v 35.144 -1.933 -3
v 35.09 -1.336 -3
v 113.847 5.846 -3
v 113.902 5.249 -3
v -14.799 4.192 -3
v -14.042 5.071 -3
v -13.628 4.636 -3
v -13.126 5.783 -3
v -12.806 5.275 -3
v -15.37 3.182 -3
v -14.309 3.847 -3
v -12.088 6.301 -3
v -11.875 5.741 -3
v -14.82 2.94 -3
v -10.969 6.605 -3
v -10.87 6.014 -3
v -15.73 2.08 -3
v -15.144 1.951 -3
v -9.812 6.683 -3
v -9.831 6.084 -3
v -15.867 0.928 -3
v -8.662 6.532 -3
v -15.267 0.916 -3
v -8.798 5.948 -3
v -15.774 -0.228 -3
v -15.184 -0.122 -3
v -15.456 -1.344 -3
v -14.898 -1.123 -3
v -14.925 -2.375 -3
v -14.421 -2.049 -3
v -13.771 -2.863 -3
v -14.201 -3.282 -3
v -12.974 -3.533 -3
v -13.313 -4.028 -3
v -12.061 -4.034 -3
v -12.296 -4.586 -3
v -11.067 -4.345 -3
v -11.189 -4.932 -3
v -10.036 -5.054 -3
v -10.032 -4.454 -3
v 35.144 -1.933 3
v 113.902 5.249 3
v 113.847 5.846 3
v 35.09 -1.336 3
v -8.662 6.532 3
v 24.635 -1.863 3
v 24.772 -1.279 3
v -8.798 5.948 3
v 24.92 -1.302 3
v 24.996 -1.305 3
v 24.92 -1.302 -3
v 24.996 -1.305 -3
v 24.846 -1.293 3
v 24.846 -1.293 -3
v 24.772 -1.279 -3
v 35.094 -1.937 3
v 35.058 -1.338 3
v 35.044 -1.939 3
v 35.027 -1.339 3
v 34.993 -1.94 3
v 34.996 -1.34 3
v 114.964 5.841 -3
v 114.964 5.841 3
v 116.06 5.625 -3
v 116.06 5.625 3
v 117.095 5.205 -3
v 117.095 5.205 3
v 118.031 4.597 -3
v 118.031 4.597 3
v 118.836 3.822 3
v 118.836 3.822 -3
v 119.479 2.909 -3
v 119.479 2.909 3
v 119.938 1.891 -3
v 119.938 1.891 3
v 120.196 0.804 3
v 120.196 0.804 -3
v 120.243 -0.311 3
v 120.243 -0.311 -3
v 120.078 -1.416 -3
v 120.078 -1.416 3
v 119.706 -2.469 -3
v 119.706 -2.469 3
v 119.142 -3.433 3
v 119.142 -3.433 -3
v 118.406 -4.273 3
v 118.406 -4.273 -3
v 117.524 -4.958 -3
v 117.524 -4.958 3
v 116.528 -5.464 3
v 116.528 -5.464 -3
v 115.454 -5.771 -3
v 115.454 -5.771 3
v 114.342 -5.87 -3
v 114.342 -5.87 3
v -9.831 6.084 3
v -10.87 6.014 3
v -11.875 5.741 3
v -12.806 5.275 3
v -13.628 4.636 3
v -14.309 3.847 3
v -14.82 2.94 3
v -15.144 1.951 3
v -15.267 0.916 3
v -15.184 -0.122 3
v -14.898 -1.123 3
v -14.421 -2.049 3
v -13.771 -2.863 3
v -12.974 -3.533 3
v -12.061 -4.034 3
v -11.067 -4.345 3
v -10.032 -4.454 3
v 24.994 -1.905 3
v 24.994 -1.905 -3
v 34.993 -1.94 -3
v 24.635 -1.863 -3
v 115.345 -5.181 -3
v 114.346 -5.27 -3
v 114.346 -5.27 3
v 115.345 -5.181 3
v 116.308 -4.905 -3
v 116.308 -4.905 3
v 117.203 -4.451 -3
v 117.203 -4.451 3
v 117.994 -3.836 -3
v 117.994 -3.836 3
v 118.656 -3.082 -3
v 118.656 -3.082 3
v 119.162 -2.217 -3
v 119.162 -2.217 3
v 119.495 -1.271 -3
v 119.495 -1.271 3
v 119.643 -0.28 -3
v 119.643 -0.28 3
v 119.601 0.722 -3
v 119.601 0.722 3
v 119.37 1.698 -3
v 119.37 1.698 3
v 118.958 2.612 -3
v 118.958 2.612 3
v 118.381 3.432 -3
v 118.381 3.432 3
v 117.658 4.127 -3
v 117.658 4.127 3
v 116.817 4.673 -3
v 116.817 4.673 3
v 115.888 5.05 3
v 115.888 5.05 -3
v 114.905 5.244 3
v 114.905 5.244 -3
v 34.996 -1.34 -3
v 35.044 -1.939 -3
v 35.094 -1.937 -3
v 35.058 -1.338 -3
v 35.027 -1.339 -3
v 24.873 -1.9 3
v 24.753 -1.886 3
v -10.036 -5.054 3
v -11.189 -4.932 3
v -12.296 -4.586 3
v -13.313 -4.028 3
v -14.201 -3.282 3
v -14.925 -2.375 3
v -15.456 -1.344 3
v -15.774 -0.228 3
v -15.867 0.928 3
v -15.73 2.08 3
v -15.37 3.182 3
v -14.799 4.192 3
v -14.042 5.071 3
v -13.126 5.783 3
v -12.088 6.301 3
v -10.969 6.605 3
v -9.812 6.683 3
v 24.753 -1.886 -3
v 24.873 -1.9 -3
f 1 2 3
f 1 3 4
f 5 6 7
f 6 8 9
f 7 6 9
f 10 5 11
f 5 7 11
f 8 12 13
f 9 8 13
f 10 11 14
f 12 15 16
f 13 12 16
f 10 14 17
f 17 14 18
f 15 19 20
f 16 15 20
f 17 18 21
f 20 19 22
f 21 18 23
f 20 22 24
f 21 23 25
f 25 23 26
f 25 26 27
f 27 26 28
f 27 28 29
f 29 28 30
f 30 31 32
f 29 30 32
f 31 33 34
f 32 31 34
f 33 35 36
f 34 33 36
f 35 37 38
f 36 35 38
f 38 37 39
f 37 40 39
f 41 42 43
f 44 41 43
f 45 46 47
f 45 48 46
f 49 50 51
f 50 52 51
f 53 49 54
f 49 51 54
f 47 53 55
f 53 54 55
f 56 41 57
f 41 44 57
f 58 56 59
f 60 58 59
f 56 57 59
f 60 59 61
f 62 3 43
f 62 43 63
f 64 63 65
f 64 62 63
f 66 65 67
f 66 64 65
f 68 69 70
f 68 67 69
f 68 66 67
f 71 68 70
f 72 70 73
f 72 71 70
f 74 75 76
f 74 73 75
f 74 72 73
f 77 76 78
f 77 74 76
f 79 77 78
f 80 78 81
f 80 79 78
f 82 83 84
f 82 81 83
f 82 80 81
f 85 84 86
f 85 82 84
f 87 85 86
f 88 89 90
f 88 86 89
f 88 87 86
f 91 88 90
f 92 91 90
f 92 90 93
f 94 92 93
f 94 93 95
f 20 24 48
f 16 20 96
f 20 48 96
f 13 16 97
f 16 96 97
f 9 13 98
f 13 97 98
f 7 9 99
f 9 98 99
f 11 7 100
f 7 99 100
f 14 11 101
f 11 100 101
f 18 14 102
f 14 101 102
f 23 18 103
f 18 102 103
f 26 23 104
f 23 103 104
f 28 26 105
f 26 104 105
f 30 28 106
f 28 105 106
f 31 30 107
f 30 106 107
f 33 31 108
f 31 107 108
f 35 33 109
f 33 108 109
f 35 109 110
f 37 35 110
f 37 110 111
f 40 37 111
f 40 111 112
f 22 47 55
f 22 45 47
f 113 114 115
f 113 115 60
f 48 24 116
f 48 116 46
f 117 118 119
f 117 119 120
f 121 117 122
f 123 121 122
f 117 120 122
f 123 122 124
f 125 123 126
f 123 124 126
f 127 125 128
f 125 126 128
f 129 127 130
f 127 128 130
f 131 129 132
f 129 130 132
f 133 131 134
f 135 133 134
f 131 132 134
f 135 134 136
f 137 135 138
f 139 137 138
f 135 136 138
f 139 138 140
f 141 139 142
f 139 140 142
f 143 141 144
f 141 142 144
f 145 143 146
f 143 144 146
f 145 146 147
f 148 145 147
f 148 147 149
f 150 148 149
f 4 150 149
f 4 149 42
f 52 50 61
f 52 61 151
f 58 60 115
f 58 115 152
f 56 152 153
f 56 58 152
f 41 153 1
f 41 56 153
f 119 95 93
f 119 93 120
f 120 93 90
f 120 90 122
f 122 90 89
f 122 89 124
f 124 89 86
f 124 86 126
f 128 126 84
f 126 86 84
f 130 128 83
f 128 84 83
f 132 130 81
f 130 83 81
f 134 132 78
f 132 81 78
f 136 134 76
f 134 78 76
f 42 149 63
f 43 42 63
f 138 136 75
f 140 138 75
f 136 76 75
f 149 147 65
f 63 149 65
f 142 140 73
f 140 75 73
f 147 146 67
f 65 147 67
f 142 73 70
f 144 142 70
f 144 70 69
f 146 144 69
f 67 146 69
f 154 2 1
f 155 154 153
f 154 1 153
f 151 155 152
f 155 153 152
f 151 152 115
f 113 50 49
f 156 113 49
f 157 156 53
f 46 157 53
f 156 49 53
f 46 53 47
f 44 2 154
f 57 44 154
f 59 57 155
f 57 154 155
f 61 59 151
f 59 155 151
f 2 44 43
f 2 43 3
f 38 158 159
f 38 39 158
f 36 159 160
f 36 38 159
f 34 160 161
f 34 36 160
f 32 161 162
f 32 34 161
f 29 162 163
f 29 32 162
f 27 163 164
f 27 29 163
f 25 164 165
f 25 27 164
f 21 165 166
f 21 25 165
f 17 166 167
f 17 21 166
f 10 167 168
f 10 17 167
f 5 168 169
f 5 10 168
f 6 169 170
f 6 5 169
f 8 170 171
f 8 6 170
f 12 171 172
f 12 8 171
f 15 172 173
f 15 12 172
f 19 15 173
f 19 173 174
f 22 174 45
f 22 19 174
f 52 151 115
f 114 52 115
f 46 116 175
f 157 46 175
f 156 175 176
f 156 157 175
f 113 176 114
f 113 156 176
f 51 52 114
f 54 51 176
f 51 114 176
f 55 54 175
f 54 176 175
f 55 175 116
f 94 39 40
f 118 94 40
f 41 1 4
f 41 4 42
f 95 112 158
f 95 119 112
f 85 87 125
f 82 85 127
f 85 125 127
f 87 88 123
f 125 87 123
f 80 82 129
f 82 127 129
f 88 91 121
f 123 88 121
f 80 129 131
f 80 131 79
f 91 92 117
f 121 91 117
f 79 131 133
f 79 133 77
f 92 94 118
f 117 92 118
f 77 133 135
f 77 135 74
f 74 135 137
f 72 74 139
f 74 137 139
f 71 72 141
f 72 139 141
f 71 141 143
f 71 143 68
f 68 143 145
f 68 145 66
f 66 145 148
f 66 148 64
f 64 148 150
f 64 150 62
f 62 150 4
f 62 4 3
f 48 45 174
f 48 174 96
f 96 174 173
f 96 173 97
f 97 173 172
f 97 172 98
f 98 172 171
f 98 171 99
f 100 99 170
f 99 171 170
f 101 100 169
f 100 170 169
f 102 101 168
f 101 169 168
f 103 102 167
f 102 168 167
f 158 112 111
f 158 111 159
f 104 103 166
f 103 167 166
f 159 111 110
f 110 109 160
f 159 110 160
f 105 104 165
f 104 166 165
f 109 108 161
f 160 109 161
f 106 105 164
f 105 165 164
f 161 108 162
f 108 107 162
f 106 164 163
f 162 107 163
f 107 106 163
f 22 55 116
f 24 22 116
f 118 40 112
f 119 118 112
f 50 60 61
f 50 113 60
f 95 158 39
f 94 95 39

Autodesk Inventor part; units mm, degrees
sketch "Skizzenpfad" plane through (0, 0, 0) normal (0, 0, 1) x (1, 0, 0)
  arc A0 (114.343934, -5.570303) -> (113.874605, 5.547406) centre (114.380472, 0) ccw
  arc A1 (-8.729894, 6.240184) -> (-10.033775, -4.754459) centre (-9.997237, 0.815845) ccw
  arc A2 (24.703327, -1.571154) -> (24.994596, -1.605239) centre (24.999094, -0.305247) ccw
  arc A3 (34.994536, -1.639838) -> (35.117091, -1.634474) centre (34.999034, -0.339846) ccw
  line L0 (35.117091, -1.634474) -> (113.874605, 5.547406)
  line L1 (114.343934, -5.570303) -> (-10.033775, -4.754459)
  line L2 (-8.729894, 6.240184) -> (24.703327, -1.571154)
  line L3 (24.994596, -1.605239) -> (34.994536, -1.639838)
ref_plane "Querschnittsebene" through (113.874605, 5.547406, 0) normal (-0.995868, -0.090813, 0) x (0, 0, 1)
ref_plane "Arbeitsebene2" through (114.380472, 0, 0) normal (-1, 0, 0) x (0, 0, 1)
ref_plane "Arbeitsebene3" through (-9.997237, 0.815845, 0) normal (0.99382, -0.1110038, 0) x (0, 0, 1)
sketch "Querschnitt" plane through (113.874605, 5.547406, 0) normal (-0.995868, -0.090813, 0) x (0, 0, 1)
  line L0 (-3, 0.3) -> (3, 0.3)
  line L1 (3, 0.3) -> (3, -0.3)
  line L2 (3, -0.3) -> (-3, -0.3)
  line L3 (-3, -0.3) -> (-3, 0.3)
  line L4 (-3, 0) -> (3, 0) construction
  point P0 (0, 0)
  point P1 (0, 0)
  dimension "d0" = 6
  dimension "d4" = 0.3
  dimension "d5" = 0.3
sweep "Riemen" add profiles "Querschnitt" path "Skizzenpfad"
equation "\"d0\" = da_B"
equation "\"d4\" = da_a"
equation "\"d5\" = da_a2"
equation "\"da_B\" = 6"
equation "\"da_pb\" = 2.5"
equation "\"da_L\" = 285"
equation "\"da_a\" = 0.3"
equation "\"da_S\" = 1.5"
equation "\"da_Beta\" = 20deg"
equation "\"da_Ht\" = 0.7"
equation "\"da_H\" = 1.3"
equation "\"da_a2\" = 0.3"
properties part number "Zahnriemen" material "Rubber"
